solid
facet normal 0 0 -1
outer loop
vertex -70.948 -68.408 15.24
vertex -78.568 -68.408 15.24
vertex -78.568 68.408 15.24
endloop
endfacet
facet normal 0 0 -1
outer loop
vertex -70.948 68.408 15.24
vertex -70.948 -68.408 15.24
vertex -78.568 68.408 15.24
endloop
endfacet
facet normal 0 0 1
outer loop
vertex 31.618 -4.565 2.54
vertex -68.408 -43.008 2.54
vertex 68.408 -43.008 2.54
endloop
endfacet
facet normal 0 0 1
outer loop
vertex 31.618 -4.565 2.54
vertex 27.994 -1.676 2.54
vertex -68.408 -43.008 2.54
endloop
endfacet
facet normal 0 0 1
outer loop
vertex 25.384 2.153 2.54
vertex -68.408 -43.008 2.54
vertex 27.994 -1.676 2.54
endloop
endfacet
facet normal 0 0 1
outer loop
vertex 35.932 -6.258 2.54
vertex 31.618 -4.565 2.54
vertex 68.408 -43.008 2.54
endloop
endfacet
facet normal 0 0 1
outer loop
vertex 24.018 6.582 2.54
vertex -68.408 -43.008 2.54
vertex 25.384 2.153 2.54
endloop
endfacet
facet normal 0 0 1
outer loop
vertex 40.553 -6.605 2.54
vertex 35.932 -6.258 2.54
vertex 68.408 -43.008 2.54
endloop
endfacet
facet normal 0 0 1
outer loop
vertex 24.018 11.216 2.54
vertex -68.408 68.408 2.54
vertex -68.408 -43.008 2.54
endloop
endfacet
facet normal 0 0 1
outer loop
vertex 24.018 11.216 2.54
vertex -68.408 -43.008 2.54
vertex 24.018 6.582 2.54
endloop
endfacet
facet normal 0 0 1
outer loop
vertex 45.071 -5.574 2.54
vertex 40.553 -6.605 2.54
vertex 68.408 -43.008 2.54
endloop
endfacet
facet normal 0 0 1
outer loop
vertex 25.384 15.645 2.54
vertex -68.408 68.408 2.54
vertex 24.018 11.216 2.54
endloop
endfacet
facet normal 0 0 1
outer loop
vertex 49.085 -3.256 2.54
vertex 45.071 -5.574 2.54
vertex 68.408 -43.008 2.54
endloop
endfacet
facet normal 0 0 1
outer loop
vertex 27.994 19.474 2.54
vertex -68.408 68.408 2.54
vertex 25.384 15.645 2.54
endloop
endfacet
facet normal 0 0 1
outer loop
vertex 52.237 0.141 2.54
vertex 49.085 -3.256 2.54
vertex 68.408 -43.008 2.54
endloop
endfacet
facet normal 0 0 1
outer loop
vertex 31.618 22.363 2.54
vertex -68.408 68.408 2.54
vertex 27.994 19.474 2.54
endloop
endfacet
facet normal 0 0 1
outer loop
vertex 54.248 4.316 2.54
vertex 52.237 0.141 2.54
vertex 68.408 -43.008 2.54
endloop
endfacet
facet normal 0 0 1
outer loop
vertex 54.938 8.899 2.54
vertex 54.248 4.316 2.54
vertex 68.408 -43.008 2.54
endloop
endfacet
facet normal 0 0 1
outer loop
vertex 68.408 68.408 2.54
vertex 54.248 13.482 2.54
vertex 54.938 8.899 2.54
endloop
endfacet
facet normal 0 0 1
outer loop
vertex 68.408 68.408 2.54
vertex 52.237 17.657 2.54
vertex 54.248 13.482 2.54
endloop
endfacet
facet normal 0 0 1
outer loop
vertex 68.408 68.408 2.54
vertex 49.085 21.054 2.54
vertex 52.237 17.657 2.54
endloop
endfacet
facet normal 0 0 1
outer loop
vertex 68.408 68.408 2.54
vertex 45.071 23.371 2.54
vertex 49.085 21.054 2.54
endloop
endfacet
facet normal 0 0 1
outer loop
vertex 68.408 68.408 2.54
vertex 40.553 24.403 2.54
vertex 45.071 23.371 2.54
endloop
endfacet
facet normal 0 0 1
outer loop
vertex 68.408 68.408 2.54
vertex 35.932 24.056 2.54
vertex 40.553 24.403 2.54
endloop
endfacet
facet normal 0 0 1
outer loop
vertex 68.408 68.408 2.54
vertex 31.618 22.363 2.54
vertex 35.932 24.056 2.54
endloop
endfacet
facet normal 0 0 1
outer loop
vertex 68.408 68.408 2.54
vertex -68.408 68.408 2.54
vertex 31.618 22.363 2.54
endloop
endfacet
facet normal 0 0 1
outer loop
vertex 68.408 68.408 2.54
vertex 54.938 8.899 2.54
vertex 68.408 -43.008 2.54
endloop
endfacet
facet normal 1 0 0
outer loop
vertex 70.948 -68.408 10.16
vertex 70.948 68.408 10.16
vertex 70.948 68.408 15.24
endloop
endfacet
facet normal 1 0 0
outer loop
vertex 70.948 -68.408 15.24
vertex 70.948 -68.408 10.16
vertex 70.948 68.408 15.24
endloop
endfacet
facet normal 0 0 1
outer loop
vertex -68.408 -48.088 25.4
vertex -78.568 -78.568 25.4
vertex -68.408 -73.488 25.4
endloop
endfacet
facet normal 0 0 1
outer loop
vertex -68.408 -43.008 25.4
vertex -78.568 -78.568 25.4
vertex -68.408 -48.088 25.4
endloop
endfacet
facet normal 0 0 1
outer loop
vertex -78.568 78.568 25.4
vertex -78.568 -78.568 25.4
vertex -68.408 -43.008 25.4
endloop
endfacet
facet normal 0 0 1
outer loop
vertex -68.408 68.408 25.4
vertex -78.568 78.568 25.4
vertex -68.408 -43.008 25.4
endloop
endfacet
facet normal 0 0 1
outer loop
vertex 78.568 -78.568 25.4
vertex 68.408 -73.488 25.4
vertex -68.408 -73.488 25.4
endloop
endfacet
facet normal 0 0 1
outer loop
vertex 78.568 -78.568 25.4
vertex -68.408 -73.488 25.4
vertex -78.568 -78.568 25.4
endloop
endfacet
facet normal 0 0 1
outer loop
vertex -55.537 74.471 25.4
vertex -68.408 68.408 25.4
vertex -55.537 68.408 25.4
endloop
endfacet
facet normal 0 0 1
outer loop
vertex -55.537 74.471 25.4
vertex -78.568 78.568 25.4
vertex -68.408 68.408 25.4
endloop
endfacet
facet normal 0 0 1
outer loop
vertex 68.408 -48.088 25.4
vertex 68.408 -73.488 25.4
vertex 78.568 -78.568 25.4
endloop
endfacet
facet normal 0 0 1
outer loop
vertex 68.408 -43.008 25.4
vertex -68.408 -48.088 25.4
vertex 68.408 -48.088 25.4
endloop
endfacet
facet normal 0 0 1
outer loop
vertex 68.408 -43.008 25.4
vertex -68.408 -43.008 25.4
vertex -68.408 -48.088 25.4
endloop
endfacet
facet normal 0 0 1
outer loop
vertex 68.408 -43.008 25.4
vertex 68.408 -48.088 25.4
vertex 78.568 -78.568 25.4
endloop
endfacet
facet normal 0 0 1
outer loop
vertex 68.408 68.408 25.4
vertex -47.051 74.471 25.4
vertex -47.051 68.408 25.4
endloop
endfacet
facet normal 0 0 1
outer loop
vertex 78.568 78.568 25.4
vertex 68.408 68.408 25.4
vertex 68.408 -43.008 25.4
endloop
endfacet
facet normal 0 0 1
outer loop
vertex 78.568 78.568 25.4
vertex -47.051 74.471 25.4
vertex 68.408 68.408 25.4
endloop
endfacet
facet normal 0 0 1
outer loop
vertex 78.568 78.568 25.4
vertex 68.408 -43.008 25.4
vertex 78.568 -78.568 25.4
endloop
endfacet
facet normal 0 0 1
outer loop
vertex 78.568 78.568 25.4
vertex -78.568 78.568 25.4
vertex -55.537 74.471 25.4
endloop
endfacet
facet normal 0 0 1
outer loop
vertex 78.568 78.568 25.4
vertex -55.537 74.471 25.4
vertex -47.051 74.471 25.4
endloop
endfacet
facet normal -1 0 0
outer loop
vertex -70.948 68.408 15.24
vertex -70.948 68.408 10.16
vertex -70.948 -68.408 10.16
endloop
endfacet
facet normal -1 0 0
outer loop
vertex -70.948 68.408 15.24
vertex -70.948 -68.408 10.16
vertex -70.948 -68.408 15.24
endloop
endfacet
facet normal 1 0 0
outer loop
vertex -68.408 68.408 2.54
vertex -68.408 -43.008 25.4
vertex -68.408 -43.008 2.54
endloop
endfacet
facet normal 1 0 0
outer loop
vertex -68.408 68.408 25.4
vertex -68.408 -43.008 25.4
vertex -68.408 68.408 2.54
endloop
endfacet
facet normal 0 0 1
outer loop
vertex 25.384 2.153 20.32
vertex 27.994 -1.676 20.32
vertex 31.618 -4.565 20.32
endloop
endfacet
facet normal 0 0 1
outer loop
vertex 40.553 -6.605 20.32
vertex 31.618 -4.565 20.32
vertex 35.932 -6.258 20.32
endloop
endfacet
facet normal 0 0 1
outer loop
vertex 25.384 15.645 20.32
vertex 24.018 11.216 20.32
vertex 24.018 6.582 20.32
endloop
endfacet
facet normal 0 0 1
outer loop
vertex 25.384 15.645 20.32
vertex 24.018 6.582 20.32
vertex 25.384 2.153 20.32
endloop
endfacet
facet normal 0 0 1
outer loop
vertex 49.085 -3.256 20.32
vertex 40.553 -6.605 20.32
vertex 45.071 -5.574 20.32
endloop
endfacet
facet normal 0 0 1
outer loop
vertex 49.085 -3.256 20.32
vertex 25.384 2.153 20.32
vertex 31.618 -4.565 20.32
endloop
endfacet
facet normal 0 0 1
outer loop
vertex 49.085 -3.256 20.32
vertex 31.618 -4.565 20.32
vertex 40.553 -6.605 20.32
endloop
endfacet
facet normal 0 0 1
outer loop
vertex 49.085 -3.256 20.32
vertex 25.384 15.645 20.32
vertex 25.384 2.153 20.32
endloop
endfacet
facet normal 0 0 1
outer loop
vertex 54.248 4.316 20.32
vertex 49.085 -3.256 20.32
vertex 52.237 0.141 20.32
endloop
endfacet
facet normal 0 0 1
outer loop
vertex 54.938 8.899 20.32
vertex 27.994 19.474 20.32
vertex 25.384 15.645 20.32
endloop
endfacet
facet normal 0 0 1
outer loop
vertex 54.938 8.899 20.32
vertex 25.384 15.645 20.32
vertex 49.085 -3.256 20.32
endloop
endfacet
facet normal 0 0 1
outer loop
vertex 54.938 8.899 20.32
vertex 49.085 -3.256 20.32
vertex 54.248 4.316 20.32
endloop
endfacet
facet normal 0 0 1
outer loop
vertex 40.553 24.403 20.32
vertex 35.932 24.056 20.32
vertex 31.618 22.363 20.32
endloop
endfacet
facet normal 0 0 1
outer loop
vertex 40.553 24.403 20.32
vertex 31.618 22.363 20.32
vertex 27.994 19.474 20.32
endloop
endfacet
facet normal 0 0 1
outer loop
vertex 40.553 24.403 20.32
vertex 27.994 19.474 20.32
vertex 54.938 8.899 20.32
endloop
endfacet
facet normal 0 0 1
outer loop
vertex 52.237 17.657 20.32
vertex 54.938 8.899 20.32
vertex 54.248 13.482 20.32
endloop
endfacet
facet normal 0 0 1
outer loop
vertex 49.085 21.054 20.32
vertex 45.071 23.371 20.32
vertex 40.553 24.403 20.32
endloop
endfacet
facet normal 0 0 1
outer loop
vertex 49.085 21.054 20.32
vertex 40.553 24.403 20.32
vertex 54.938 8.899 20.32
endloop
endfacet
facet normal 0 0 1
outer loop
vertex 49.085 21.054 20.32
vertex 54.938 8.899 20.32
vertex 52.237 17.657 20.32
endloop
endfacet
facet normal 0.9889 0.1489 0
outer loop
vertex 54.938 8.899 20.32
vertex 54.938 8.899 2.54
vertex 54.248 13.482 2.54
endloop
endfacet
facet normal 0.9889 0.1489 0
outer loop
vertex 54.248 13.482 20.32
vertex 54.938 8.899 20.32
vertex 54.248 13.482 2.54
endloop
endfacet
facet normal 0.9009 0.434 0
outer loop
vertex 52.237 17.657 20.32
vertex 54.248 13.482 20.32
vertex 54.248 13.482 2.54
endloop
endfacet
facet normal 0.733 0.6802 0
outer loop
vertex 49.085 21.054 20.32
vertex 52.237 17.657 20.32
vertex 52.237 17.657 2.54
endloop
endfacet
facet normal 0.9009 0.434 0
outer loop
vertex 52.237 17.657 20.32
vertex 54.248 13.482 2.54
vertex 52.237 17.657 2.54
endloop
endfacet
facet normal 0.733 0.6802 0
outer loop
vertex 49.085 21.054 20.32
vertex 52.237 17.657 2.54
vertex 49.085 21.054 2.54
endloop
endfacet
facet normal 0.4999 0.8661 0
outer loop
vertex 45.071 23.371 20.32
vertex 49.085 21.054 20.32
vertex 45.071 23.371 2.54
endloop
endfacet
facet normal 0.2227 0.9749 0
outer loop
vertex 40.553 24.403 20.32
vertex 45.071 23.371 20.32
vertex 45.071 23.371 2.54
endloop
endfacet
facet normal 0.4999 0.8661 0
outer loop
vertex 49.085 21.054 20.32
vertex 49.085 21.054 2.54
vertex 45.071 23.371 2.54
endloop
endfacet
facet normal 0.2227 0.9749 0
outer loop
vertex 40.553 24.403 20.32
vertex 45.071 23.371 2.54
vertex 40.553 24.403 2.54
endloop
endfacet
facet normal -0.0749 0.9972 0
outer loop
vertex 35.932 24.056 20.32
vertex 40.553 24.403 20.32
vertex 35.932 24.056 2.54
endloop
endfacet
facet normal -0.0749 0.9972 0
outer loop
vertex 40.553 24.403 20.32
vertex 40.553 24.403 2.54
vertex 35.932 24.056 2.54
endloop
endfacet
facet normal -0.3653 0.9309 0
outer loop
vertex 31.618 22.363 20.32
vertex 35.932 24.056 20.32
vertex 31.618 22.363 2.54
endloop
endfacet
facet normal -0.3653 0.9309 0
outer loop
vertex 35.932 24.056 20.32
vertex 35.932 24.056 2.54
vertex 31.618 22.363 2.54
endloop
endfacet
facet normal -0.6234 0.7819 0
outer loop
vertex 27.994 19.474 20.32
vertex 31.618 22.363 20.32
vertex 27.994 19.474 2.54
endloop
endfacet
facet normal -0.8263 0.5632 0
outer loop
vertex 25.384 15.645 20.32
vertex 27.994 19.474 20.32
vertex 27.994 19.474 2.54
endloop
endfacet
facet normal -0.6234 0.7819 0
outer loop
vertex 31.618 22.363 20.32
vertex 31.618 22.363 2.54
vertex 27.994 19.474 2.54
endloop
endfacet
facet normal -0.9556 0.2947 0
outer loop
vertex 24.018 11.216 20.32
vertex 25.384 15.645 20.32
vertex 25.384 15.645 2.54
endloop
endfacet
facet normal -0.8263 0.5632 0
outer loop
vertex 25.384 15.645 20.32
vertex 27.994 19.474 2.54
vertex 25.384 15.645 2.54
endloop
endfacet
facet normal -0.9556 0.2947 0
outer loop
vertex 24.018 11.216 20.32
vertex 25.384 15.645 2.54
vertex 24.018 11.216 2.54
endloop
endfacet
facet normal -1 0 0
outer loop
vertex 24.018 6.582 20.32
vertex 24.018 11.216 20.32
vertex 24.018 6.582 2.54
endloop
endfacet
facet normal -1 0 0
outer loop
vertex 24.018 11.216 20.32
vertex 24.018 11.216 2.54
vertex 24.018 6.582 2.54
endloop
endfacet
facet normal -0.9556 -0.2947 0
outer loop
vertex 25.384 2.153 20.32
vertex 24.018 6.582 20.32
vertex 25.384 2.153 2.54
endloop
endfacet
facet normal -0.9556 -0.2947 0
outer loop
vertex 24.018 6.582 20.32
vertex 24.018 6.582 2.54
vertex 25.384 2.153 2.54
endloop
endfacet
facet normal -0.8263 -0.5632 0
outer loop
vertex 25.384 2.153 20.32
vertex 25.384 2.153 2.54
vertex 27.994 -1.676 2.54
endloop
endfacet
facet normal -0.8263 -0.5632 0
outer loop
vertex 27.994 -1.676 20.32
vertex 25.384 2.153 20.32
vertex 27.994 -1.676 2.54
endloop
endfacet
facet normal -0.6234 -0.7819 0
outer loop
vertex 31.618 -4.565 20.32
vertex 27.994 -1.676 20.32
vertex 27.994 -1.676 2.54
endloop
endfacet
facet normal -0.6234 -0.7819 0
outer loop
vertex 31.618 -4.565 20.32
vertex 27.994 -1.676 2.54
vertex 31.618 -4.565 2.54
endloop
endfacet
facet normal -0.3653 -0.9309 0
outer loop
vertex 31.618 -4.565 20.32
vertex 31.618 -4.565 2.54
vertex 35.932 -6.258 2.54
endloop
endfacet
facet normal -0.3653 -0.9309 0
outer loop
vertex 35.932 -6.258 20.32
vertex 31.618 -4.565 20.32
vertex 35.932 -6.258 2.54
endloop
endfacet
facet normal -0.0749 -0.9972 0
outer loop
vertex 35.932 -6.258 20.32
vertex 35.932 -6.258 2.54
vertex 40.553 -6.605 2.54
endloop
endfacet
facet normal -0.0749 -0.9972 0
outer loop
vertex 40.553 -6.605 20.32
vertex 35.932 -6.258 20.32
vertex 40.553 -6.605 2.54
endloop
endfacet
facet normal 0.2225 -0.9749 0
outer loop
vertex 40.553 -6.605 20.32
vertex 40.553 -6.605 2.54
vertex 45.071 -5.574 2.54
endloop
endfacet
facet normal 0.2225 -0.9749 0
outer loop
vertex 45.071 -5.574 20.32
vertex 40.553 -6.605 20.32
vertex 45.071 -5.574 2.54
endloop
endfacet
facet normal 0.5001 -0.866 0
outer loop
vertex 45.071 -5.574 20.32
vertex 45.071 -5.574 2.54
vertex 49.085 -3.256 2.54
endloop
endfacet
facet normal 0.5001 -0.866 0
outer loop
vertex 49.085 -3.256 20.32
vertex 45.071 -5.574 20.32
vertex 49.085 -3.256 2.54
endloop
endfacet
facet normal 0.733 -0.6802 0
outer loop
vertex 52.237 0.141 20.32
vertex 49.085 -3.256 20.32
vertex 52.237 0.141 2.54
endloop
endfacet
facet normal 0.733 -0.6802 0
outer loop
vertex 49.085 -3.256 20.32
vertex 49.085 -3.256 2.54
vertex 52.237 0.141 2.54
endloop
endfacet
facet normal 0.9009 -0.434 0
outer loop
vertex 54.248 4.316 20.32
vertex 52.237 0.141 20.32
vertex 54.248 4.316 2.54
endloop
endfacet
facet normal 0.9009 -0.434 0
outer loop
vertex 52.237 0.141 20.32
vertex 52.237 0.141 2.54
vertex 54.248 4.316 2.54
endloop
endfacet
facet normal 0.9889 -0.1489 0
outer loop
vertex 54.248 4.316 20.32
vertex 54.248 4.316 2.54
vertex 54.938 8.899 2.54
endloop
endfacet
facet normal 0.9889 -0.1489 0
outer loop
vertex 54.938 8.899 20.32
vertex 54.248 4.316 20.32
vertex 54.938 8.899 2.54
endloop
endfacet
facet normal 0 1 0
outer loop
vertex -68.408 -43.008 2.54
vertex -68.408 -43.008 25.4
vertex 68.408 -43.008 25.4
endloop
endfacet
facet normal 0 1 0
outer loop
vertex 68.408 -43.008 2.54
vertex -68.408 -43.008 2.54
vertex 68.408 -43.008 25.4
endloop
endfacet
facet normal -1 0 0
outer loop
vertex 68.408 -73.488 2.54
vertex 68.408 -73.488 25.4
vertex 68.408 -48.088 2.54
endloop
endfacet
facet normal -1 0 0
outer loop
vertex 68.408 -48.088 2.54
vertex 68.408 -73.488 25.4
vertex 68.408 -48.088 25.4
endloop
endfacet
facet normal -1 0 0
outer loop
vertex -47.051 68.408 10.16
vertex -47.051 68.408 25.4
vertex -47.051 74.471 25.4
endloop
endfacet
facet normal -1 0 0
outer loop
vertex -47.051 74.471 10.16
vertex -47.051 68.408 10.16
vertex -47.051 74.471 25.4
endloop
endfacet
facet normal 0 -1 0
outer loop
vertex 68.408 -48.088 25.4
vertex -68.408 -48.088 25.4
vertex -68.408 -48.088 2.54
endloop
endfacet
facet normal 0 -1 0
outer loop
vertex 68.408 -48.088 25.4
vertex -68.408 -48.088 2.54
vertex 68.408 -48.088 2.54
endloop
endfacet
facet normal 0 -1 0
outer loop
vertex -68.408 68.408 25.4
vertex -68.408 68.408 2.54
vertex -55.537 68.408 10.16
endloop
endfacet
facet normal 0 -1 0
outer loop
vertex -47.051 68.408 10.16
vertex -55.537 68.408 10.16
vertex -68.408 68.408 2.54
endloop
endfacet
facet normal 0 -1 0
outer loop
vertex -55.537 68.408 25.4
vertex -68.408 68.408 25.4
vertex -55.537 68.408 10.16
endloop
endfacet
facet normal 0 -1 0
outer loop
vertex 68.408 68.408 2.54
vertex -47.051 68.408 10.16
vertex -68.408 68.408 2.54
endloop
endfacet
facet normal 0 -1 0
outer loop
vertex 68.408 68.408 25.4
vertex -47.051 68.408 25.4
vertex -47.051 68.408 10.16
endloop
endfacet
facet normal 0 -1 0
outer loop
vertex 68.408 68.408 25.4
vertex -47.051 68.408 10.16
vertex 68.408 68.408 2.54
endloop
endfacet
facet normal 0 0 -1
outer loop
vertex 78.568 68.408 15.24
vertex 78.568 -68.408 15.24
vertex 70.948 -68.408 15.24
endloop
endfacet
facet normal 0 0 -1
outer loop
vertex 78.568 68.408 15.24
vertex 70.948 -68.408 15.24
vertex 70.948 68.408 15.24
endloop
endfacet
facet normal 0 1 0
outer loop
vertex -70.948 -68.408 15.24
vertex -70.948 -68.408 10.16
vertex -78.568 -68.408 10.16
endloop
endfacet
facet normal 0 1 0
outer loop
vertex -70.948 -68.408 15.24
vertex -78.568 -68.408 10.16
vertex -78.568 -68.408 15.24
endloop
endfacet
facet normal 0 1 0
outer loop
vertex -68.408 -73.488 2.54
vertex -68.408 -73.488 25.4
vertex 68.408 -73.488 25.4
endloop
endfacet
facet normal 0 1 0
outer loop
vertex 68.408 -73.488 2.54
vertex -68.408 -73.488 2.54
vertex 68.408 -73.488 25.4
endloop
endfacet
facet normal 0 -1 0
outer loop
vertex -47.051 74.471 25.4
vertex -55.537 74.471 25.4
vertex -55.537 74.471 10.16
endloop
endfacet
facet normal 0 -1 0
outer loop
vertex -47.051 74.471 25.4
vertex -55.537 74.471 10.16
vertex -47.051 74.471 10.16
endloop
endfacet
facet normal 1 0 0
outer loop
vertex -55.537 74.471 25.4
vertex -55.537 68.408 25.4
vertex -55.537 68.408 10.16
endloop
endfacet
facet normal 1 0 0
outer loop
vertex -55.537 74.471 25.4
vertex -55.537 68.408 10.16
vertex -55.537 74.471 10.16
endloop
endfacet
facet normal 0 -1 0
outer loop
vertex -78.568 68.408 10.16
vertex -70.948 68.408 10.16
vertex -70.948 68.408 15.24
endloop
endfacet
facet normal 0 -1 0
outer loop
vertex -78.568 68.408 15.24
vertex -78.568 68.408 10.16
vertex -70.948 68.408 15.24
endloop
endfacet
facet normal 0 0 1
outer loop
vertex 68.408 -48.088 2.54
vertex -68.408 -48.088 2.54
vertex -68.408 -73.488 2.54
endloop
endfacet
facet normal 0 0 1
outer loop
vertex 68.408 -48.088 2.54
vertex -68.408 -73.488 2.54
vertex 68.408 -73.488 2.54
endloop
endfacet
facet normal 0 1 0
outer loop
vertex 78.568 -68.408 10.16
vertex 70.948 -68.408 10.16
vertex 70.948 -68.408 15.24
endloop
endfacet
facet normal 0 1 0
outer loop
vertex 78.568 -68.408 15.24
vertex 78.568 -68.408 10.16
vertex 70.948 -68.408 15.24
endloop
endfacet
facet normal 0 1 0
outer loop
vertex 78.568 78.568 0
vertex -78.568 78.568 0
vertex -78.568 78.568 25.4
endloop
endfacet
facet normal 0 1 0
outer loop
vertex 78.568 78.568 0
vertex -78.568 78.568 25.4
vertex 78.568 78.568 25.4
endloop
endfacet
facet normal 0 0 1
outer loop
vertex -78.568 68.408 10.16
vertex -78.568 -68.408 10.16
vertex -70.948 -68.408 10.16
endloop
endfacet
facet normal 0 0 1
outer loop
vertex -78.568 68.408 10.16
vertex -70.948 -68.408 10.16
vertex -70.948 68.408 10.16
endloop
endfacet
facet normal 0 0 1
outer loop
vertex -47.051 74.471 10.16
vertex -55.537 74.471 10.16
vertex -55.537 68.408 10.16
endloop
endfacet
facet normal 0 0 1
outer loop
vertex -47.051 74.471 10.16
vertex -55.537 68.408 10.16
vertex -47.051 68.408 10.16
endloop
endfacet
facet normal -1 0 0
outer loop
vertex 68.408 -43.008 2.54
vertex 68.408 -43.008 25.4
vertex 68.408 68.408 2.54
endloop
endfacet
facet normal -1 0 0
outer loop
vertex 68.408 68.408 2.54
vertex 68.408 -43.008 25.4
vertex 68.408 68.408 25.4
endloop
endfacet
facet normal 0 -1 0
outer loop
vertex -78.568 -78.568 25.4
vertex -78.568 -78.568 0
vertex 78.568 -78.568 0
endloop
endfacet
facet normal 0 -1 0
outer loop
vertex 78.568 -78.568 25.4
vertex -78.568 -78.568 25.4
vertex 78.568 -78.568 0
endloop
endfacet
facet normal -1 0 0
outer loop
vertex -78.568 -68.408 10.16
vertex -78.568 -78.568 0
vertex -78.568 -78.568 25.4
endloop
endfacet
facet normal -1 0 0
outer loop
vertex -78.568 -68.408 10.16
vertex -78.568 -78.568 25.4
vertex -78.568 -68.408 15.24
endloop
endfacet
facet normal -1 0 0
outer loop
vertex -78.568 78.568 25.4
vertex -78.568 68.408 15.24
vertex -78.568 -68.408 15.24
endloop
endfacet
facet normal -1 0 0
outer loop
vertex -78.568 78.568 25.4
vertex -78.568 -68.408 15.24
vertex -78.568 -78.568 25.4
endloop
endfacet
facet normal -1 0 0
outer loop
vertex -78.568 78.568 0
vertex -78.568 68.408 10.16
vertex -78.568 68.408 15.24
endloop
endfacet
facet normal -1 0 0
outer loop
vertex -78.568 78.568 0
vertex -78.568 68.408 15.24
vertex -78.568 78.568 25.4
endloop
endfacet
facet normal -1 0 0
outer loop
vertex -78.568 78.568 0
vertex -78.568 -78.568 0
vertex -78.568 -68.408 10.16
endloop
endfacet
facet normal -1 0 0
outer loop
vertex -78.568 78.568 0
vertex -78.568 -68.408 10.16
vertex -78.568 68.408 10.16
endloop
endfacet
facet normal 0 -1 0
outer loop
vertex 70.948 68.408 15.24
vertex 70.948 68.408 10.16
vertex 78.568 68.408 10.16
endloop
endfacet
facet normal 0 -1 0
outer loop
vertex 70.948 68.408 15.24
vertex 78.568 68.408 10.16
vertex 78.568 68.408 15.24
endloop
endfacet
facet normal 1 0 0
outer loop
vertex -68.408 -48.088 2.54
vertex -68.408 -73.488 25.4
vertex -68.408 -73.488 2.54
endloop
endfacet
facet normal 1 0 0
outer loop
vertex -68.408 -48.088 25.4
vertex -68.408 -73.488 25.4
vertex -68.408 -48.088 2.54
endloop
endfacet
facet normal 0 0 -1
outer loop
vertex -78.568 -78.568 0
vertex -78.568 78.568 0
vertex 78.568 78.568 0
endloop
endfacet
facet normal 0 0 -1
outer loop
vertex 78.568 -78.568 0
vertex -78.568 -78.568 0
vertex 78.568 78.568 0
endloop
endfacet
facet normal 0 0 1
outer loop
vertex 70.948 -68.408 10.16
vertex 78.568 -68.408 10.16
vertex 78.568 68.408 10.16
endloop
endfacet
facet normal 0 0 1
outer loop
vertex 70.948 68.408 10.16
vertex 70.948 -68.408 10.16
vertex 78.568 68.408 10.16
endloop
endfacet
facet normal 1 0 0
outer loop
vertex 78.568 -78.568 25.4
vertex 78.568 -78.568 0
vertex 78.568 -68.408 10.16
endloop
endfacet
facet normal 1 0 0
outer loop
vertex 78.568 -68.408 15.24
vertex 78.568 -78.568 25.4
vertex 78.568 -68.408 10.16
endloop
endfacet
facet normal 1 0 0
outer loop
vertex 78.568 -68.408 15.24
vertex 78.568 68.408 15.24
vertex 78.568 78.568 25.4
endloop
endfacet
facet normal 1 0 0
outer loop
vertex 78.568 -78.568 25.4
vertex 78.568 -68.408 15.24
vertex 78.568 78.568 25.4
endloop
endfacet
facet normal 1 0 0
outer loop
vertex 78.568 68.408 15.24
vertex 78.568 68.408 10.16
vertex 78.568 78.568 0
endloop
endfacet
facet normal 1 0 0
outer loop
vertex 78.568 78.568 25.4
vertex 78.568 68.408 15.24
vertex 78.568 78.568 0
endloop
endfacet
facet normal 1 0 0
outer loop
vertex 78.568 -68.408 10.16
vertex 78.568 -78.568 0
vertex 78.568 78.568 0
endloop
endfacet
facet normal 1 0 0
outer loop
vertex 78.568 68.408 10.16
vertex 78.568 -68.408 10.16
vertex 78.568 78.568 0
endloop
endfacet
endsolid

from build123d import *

# Parameters (mm, degrees)
SKETCH1_W           = 157.13579329
SKETCH1_H           = 157.13579329
BOSS_EXTRUDE1_DEPTH = 25.4
SKETCH2_W           = 136.81579329
SKETCH2_H           = 111.41579329
CUT_EXTRUDE1_DEPTH  = 22.86
SKETCH3_W           = 136.81579329
SKETCH3_H           = 25.4
CUT_EXTRUDE2_DEPTH  = 22.86
SKETCH5_W           = 5.08
SKETCH5_H           = 136.81579329
CUT_EXTRUDE3_DEPTH  = 7.62
SKETCH6_W           = 8.486375486
SKETCH6_H           = 6.062880986
CUT_EXTRUDE4_DEPTH  = 15.24
SKETCH8_R           = 15.547206761
BOSS_EXTRUDE3_DEPTH = 17.78


with BuildPart() as part:
    # Sketch1 → Boss-Extrude1 (new body)
    with BuildSketch(Plane.XY):
        Rectangle(SKETCH1_W, SKETCH1_H)
    extrude(amount=BOSS_EXTRUDE1_DEPTH)

    # Sketch2 → Cut-Extrude1 (cut)
    with BuildSketch(Plane.XY.offset(25.4)):
        with Locations((0, 12.7)):
            Rectangle(SKETCH2_W, SKETCH2_H)
    extrude(amount=-CUT_EXTRUDE1_DEPTH, mode=Mode.SUBTRACT)

    # Sketch3 → Cut-Extrude2 (cut)
    with BuildSketch(Plane.XY.offset(25.4)):
        with Locations((0, -60.787896645)):
            Rectangle(SKETCH3_W, SKETCH3_H)
    extrude(amount=-CUT_EXTRUDE2_DEPTH, mode=Mode.SUBTRACT)

    # Sketch5 → Cut-Extrude3 (cut)
    with BuildSketch(Plane.ZY.offset(78.567896645)):
        with Locations((12.7, 0)):
            Rectangle(SKETCH5_W, SKETCH5_H)
    cut_extrude3 = extrude(amount=-CUT_EXTRUDE3_DEPTH, mode=Mode.SUBTRACT)

    # Mirror1: Cut-Extrude3 across plane
    add(cut_extrude3.mirror(Plane(origin=(0, 0, 0), x_dir=(0, 0, 1), z_dir=(1, 0, 0))), mode=Mode.SUBTRACT)

    # Sketch6 → Cut-Extrude4 (cut)
    with BuildSketch(Plane.XY.offset(25.4)):
        with Locations((-51.293944562, 71.439337138)):
            Rectangle(SKETCH6_W, SKETCH6_H)
    extrude(amount=-CUT_EXTRUDE4_DEPTH, mode=Mode.SUBTRACT)

    # Sketch8 → Boss-Extrude3 (add)
    with BuildSketch(Plane.XY.offset(2.54)):
        with Locations((39.391283746, 8.898945532)):
            Circle(SKETCH8_R)
    extrude(amount=BOSS_EXTRUDE3_DEPTH)


solid = part.part
